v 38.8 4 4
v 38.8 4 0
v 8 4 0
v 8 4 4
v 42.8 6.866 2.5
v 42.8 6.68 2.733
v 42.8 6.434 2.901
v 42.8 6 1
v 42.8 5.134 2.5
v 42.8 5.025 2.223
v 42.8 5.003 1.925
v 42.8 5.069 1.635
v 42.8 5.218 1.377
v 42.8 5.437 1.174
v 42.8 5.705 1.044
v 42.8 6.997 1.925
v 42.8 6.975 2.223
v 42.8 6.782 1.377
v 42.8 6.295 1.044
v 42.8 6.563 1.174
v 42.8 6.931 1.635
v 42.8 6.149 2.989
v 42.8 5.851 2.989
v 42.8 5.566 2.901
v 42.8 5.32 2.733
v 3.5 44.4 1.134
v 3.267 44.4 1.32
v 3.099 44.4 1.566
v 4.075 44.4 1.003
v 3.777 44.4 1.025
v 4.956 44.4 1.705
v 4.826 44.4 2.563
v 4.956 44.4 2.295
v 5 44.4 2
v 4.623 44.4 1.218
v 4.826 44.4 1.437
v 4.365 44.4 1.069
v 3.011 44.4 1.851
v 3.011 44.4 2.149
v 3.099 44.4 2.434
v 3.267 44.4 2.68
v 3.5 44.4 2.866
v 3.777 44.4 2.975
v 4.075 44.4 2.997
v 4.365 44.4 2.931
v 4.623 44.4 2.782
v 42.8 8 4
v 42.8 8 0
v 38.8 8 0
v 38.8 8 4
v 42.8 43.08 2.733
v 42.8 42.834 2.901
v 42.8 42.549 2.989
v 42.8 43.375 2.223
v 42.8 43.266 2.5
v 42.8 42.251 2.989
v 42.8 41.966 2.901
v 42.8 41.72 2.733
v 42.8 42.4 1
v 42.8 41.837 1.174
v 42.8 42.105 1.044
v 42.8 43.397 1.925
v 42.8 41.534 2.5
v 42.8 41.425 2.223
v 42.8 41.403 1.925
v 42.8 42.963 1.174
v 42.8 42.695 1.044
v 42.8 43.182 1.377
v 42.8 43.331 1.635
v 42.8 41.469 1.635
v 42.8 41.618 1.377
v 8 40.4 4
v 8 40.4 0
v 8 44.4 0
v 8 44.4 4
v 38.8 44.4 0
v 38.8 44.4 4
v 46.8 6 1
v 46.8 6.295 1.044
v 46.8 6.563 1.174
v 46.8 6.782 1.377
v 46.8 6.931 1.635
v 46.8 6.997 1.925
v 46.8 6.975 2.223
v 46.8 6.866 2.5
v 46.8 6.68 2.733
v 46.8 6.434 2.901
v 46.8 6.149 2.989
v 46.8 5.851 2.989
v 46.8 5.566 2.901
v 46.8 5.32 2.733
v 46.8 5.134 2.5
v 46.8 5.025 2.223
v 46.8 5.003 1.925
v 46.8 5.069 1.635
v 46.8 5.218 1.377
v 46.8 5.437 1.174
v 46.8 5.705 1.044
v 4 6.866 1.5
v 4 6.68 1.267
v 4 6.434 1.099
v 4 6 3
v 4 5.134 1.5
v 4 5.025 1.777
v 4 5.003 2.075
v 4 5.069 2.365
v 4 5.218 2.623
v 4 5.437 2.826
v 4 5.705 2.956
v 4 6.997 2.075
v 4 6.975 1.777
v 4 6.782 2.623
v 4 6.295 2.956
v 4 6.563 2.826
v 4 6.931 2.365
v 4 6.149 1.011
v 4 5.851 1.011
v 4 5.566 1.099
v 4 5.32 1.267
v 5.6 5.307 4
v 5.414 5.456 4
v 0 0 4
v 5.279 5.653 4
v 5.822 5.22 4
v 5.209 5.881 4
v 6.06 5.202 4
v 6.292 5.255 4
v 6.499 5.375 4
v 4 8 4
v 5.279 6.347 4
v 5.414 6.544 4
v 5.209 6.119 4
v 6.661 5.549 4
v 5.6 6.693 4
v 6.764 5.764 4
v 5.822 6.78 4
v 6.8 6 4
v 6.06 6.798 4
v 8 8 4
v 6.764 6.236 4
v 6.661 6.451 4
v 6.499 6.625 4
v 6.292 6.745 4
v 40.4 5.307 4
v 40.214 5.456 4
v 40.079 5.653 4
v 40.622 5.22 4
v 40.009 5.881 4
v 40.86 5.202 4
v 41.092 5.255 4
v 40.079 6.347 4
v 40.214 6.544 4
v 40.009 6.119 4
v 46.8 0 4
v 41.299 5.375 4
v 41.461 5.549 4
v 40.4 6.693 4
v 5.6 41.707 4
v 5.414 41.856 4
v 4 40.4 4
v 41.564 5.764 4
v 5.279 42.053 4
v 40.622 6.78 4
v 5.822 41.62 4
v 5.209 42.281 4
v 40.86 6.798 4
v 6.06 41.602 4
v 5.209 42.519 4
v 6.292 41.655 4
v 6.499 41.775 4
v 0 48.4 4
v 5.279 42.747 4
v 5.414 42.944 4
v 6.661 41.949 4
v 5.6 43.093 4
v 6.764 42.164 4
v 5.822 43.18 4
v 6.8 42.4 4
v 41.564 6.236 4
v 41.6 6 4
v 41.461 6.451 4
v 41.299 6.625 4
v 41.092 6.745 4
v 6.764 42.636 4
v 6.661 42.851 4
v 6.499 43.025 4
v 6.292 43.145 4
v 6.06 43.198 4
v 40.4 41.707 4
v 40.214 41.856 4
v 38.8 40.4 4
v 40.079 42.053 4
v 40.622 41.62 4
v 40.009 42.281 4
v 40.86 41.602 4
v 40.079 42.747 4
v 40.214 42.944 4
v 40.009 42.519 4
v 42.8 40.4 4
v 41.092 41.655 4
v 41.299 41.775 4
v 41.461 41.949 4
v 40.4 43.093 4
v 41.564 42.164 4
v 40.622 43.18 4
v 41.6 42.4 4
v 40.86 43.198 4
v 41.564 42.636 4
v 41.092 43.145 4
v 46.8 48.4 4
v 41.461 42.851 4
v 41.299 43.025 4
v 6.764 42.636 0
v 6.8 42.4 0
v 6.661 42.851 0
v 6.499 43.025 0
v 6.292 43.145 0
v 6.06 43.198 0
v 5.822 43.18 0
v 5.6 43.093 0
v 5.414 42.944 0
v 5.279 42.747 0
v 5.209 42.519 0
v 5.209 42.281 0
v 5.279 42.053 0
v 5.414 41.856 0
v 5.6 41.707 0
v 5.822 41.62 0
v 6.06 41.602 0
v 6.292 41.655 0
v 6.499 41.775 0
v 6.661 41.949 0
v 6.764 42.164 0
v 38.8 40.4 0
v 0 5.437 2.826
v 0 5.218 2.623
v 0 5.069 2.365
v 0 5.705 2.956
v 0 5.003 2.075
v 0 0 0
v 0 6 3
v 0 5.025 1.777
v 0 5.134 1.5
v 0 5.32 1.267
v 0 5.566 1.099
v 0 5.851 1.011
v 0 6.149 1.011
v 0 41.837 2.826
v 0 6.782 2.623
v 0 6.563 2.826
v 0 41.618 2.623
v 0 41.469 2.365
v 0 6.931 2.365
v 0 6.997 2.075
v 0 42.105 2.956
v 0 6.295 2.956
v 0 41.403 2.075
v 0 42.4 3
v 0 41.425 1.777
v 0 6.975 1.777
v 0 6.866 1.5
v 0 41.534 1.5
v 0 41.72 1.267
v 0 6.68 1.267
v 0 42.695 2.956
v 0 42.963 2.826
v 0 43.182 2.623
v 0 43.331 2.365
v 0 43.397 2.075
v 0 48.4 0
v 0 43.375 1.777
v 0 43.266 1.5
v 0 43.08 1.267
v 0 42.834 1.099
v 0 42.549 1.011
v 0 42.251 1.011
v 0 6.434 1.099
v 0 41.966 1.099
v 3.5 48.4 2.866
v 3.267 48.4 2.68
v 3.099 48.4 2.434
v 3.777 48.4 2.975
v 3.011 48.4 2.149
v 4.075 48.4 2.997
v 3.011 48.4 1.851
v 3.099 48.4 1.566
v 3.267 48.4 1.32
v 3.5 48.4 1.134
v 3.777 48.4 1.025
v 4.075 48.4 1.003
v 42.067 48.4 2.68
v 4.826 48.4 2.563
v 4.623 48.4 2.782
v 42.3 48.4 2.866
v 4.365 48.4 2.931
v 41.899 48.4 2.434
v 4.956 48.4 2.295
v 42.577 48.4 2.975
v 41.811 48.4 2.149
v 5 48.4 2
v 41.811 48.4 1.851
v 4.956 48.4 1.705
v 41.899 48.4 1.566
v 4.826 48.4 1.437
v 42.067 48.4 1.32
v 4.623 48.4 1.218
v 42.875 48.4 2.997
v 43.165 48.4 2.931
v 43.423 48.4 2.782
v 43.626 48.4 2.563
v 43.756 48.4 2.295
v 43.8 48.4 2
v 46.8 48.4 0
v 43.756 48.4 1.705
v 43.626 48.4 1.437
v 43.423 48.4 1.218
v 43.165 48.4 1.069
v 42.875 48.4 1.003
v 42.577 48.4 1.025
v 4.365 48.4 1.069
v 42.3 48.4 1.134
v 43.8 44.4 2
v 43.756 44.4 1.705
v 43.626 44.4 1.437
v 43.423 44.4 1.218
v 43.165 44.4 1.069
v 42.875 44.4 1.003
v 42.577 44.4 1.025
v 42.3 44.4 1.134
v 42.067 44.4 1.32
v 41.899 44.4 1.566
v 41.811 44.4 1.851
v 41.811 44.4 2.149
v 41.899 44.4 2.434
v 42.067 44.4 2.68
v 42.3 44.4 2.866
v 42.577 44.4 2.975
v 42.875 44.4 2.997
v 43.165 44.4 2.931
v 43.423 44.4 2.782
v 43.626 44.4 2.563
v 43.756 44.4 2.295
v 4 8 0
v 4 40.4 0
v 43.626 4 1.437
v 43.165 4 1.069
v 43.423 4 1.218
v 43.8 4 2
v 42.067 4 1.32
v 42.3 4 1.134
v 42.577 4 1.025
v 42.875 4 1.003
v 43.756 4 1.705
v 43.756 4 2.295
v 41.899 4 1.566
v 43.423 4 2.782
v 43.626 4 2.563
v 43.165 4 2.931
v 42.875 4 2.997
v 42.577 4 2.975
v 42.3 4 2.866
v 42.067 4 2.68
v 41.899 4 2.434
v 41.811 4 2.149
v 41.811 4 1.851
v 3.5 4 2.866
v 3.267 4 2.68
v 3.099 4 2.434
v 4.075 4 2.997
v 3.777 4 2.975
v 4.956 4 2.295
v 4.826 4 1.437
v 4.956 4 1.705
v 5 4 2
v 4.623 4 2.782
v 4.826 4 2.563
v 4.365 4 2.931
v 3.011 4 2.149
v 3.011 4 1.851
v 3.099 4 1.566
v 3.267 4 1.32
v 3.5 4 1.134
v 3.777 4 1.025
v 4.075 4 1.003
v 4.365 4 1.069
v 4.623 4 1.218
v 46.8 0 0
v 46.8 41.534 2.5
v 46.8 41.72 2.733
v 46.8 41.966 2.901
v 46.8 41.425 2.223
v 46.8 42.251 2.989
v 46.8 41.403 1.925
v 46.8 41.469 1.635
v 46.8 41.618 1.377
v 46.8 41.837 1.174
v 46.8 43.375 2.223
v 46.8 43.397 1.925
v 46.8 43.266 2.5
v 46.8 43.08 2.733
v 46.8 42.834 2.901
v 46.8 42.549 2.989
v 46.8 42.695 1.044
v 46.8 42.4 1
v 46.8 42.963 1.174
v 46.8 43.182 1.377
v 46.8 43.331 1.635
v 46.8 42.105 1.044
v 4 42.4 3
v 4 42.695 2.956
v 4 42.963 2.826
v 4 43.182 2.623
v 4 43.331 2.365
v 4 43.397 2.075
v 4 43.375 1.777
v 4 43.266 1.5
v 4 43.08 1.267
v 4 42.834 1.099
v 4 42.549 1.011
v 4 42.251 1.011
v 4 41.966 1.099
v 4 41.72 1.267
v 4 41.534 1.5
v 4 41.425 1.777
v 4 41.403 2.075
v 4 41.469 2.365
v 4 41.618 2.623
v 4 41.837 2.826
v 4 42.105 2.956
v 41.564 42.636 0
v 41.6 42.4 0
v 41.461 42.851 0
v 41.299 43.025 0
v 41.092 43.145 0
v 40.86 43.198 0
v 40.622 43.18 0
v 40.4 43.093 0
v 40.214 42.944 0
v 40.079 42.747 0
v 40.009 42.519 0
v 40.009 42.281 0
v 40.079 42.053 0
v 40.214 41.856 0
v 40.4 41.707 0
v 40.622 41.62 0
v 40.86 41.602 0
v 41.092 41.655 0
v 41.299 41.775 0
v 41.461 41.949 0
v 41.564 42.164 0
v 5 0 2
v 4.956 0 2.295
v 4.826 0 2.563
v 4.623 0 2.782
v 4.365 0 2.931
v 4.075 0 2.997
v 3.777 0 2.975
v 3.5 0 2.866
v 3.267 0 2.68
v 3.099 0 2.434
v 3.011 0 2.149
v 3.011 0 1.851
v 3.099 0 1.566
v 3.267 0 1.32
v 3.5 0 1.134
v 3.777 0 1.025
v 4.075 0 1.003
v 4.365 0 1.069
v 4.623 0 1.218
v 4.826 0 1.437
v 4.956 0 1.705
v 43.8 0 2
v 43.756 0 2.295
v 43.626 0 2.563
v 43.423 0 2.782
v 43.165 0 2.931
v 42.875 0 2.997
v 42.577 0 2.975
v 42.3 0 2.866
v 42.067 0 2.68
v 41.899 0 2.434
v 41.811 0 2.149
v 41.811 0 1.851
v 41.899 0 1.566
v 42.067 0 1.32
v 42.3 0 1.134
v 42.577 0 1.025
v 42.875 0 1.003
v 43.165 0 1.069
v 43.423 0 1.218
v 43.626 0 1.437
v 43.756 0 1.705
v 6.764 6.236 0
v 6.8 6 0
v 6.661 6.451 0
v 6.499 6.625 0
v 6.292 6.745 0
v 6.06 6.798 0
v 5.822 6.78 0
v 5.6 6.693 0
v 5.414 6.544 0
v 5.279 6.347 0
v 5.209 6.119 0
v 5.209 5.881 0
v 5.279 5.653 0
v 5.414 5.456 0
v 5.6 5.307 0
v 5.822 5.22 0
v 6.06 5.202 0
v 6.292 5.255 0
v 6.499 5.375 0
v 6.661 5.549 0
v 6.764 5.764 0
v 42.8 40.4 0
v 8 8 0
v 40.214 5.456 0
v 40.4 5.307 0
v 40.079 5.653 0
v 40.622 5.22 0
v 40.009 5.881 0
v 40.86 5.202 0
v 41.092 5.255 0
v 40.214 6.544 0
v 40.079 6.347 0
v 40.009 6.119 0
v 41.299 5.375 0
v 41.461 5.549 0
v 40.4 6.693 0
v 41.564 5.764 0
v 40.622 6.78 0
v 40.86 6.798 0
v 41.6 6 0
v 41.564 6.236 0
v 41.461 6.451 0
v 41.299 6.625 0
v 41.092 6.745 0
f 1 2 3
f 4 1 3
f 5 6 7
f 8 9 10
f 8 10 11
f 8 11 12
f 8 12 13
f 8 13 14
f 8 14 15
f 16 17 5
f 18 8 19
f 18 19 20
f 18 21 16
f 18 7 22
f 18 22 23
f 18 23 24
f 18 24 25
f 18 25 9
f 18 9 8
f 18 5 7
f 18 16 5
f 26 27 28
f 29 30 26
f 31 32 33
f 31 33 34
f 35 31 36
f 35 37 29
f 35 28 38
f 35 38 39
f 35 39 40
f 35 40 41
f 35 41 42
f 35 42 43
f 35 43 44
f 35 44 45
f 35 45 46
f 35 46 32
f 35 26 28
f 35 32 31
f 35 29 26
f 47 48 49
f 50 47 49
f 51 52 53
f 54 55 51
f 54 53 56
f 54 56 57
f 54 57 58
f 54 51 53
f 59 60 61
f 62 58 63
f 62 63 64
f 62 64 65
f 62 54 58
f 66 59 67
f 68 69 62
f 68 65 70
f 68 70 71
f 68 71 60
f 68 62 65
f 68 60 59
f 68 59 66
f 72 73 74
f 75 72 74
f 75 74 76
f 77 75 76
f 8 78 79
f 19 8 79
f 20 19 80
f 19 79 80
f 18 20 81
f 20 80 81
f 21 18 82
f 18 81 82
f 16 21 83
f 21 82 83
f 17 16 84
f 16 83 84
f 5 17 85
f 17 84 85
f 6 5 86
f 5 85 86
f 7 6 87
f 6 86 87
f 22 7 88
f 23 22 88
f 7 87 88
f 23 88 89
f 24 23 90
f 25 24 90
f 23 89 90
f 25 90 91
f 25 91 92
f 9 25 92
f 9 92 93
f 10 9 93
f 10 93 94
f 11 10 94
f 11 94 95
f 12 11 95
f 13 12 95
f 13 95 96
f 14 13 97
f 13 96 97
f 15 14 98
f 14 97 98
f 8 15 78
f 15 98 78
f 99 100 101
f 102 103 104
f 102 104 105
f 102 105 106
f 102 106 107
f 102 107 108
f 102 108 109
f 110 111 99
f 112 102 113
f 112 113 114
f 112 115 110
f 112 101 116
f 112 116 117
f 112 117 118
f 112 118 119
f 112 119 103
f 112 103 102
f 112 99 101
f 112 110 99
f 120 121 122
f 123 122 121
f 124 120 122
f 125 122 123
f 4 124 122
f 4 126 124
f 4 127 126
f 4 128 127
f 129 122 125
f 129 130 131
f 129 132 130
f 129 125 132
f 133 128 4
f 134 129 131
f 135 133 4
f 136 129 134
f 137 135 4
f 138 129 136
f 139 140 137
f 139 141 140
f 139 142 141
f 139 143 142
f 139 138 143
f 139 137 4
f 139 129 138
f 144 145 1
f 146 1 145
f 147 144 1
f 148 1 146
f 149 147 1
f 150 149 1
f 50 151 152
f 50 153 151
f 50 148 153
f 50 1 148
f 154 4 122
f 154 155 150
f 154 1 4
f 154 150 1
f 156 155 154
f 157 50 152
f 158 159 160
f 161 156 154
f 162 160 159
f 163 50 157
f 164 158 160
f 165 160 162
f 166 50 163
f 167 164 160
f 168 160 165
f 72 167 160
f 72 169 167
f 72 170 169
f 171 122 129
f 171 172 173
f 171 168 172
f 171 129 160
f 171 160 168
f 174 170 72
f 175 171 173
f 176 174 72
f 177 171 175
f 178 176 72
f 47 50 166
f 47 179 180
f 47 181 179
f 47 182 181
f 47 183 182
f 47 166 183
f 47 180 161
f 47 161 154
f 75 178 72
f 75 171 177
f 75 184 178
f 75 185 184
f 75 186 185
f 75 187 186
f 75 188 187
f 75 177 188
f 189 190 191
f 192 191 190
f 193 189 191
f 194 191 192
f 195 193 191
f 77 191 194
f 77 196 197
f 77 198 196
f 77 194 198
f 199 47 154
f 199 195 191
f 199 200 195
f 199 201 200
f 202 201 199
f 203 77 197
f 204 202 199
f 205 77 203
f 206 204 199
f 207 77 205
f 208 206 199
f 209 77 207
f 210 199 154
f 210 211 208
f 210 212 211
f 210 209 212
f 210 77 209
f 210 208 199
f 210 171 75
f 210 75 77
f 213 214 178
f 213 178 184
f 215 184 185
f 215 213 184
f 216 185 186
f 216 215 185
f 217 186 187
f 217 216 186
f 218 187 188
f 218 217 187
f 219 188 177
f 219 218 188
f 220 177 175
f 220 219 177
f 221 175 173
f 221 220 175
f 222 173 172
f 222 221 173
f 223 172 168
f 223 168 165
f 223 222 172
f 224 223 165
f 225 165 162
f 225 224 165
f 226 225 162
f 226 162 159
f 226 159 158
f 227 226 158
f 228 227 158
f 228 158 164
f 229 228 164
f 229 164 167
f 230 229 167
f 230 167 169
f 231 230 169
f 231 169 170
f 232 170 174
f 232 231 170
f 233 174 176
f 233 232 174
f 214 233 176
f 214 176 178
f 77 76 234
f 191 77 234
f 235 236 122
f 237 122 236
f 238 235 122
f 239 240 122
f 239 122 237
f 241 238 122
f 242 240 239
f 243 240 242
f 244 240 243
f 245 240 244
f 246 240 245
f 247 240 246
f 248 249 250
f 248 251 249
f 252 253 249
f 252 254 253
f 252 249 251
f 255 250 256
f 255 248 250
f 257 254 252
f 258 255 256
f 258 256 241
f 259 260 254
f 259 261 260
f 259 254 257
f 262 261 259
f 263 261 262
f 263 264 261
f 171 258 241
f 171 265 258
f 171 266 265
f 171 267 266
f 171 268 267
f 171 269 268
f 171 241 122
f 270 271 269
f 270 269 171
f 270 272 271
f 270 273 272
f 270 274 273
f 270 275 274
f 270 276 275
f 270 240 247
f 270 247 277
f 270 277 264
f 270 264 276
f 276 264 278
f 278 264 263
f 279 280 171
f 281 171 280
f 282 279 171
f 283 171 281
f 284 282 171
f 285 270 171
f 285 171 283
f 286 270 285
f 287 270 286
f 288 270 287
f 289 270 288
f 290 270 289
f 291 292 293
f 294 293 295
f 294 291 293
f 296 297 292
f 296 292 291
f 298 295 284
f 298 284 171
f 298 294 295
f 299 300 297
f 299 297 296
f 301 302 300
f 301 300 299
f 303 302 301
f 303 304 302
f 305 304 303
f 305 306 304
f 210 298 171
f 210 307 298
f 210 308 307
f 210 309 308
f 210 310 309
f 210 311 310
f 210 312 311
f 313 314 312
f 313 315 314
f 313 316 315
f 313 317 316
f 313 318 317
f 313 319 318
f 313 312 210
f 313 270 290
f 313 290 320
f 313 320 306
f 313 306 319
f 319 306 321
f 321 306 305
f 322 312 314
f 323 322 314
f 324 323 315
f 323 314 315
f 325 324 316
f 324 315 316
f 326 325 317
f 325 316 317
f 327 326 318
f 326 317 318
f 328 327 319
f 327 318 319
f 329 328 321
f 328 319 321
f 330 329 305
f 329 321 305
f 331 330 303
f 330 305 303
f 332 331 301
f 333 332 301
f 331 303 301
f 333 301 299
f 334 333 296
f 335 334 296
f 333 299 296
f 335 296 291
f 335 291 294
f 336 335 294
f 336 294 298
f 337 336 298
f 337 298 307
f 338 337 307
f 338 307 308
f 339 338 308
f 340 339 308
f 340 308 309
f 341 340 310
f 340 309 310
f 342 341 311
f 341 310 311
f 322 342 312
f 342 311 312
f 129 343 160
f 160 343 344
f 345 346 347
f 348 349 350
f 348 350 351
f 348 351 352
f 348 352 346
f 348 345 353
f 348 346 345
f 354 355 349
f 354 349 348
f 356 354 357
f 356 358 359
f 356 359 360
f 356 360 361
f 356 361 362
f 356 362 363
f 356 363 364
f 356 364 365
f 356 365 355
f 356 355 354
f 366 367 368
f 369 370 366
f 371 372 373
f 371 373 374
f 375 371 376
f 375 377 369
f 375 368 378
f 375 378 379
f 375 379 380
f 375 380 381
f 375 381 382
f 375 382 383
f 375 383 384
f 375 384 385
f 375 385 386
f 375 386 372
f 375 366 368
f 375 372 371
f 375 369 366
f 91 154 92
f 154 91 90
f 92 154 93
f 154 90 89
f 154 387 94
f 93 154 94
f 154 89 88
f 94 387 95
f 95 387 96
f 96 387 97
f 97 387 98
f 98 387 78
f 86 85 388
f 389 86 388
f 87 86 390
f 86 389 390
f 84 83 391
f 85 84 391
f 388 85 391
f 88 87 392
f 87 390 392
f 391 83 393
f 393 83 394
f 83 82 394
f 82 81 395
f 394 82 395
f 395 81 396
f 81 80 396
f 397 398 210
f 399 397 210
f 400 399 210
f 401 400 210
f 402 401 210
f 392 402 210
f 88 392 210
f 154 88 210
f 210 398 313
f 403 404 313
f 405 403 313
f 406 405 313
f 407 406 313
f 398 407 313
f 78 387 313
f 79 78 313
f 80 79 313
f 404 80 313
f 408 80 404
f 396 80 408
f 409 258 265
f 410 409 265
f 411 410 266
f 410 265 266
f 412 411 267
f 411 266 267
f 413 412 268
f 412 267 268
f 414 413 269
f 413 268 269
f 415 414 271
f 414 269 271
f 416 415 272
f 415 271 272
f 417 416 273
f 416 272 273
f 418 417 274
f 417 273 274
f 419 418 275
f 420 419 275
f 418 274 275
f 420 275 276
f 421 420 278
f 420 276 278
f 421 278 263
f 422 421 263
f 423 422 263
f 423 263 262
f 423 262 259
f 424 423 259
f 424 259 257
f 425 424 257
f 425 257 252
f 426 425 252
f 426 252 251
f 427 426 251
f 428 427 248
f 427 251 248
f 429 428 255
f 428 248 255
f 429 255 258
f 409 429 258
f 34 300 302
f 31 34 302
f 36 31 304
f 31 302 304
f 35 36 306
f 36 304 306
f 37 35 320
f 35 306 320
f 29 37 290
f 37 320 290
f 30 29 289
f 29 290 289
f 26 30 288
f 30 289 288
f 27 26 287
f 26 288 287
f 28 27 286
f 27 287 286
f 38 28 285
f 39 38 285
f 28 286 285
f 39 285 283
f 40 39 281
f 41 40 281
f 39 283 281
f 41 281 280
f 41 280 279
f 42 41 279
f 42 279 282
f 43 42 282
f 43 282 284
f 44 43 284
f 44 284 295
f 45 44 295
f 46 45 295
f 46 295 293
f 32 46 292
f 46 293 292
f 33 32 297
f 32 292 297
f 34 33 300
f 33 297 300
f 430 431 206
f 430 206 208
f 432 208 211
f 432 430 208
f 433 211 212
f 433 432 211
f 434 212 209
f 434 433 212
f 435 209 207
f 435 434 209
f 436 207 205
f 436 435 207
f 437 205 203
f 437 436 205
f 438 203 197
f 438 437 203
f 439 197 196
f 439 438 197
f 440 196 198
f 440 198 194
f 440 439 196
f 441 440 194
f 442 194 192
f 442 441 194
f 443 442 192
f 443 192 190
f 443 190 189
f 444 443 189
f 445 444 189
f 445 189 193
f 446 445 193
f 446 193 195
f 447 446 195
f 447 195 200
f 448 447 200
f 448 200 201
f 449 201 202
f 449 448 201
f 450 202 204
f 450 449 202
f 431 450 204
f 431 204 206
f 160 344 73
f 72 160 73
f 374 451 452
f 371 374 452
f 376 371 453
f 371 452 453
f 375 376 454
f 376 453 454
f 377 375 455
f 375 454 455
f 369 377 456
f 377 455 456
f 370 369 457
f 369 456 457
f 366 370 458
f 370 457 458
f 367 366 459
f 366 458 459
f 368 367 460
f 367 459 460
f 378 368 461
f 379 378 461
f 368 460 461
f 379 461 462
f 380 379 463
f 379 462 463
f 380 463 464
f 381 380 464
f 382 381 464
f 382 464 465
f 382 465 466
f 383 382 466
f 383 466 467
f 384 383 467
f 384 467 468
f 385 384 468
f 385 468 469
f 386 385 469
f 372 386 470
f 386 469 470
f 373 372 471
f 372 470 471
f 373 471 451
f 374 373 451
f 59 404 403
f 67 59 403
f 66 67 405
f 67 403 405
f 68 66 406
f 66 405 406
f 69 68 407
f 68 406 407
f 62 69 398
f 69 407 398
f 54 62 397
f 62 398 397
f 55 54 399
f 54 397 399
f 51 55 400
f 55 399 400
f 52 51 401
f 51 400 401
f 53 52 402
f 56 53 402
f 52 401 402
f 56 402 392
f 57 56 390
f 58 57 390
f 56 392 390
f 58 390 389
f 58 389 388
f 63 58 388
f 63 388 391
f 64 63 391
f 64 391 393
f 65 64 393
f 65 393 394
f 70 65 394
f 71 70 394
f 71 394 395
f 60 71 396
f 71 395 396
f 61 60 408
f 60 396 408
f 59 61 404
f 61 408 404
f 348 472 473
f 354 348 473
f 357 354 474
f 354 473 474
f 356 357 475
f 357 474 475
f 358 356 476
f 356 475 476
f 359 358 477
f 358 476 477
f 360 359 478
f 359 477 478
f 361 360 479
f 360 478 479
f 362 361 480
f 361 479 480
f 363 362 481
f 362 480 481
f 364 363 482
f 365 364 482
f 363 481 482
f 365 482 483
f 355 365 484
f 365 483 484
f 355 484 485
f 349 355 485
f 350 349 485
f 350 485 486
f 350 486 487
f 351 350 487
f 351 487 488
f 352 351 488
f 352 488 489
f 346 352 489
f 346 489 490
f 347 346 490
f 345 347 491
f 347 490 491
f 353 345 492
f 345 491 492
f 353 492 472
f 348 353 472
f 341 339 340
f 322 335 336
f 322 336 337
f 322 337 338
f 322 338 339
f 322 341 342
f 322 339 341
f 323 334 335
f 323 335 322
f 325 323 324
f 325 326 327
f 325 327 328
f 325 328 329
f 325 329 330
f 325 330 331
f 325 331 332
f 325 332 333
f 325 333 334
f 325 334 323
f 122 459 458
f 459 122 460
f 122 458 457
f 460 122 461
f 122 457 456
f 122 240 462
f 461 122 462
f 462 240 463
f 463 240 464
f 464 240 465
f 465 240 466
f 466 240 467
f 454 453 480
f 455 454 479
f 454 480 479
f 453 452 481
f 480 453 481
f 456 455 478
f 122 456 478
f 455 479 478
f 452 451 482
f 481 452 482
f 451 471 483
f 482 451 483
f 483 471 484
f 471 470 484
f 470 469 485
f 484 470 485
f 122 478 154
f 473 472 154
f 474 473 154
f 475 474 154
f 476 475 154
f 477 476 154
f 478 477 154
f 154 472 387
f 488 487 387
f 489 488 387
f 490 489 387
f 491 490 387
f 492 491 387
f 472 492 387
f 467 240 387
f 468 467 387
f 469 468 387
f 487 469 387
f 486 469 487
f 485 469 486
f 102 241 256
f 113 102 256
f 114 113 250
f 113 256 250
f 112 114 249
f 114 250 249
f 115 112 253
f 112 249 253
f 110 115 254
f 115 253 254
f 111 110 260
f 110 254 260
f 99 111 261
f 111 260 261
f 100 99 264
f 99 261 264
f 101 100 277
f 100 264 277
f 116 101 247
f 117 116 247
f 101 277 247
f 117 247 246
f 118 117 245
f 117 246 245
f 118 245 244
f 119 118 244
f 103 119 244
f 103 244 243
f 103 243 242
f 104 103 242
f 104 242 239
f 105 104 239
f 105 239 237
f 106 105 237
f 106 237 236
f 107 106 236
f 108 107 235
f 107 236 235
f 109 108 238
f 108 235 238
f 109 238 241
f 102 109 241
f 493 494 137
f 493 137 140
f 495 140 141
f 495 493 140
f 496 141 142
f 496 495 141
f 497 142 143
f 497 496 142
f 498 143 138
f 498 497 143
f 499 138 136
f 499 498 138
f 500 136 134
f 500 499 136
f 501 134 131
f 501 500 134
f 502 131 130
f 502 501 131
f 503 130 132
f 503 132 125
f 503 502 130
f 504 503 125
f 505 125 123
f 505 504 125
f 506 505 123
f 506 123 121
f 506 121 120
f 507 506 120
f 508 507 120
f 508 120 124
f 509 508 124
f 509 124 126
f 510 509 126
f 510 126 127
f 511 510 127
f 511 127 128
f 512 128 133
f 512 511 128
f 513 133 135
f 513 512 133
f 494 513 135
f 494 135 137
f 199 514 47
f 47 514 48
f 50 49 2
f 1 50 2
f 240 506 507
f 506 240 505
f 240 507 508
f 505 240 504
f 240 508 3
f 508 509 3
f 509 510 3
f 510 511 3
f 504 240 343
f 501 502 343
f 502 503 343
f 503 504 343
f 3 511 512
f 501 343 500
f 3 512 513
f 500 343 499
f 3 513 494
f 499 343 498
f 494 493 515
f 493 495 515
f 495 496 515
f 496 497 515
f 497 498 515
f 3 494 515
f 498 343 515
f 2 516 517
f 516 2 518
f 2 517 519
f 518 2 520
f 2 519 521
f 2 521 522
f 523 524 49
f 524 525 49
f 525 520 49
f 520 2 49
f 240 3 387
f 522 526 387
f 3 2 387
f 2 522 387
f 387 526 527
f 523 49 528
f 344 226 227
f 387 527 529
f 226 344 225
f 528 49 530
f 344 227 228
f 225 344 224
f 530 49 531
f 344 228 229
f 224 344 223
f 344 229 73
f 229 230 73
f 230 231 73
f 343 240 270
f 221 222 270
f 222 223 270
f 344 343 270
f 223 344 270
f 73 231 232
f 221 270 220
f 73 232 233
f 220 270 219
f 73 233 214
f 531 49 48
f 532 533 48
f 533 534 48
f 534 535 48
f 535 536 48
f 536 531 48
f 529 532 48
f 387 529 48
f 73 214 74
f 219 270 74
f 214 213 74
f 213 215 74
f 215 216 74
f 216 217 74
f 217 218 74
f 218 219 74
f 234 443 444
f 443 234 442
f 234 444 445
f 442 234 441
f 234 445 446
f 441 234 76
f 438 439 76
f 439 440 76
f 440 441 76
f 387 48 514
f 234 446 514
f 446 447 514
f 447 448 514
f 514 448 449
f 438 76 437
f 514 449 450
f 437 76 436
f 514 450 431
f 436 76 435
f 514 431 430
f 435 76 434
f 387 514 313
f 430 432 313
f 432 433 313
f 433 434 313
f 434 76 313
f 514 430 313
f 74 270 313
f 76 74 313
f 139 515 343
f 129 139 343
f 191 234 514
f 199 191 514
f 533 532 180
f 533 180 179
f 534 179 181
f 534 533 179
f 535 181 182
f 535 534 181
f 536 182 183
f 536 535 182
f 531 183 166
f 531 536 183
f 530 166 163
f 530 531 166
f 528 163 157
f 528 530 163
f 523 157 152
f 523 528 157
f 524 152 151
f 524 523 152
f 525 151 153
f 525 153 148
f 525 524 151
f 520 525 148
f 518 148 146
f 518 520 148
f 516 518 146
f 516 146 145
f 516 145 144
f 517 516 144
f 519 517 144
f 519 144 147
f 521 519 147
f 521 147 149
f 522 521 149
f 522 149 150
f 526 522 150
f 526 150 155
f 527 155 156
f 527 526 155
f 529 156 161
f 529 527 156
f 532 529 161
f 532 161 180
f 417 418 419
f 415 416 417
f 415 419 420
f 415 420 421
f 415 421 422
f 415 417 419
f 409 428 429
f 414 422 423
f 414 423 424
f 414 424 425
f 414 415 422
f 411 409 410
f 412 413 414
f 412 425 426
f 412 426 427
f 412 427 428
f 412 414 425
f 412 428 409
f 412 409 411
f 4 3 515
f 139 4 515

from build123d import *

# Parameters (mm, degrees)
SKETCH1_W          = 46.8
SKETCH1_H          = 48.4
SKETCH1_R          = 0.8
LEFT_PANEL_DEPTH   = 4
SKETCH9_R          = 1
CUT_EXTRUDE5_DEPTH = 4
SKETCH10_R         = 1
CUT_EXTRUDE6_DEPTH = 4
SKETCH11_R         = 1
CUT_EXTRUDE7_DEPTH = 4
SKETCH12_R         = 1
CUT_EXTRUDE8_DEPTH = 4


with BuildPart() as part:
    # Sketch1 → left_panel (new body)
    with BuildSketch(Plane.XY):
        with Locations((23.4, 24.2)):
            Rectangle(SKETCH1_W, SKETCH1_H)
        with Locations((6, 6)):
            Circle(SKETCH1_R, mode=Mode.SUBTRACT)
        with Locations((40.8, 6)):
            Circle(SKETCH1_R, mode=Mode.SUBTRACT)
        with Locations((40.8, 42.4)):
            Circle(SKETCH1_R, mode=Mode.SUBTRACT)
        with Locations((6, 42.4)):
            Circle(SKETCH1_R, mode=Mode.SUBTRACT)
        Polygon((8, 44.4), (38.8, 44.4), (38.8, 40.4), (42.8, 40.4), (42.8, 8), (38.8, 8), (38.8, 4), (8, 4), (8, 8), (4, 8), (4, 40.4), (8, 40.4), align=None, mode=Mode.SUBTRACT)
    extrude(amount=LEFT_PANEL_DEPTH)

    # Sketch9 → Cut-Extrude5 (cut)
    with BuildSketch(Plane(origin=(46.8, 0, 0), x_dir=(0, 0, -1), z_dir=(1, 0, 0))):
        with Locations((-2, 6)):
            Circle(SKETCH9_R)
        with Locations((-2, 42.4)):
            Circle(SKETCH9_R)
    extrude(amount=-CUT_EXTRUDE5_DEPTH, mode=Mode.SUBTRACT)

    # Sketch10 → Cut-Extrude6 (cut)
    with BuildSketch(Plane.ZY):
        with Locations((2, 6)):
            Circle(SKETCH10_R)
        with Locations((2, 42.4)):
            Circle(SKETCH10_R)
    extrude(amount=-CUT_EXTRUDE6_DEPTH, mode=Mode.SUBTRACT)

    # Sketch11 → Cut-Extrude7 (cut)
    with BuildSketch(Plane(origin=(0, 48.4, 0), x_dir=(1, 0, 0), z_dir=(0, 1, 0))):
        with Locations((4, -2)):
            Circle(SKETCH11_R)
        with Locations((42.8, -2)):
            Circle(SKETCH11_R)
    extrude(amount=-CUT_EXTRUDE7_DEPTH, mode=Mode.SUBTRACT)

    # Sketch12 → Cut-Extrude8 (cut)
    with BuildSketch(Plane.XZ):
        with Locations((4, 2)):
            Circle(SKETCH12_R)
        with Locations((42.8, 2)):
            Circle(SKETCH12_R)
    extrude(amount=-CUT_EXTRUDE8_DEPTH, mode=Mode.SUBTRACT)


solid = part.part
